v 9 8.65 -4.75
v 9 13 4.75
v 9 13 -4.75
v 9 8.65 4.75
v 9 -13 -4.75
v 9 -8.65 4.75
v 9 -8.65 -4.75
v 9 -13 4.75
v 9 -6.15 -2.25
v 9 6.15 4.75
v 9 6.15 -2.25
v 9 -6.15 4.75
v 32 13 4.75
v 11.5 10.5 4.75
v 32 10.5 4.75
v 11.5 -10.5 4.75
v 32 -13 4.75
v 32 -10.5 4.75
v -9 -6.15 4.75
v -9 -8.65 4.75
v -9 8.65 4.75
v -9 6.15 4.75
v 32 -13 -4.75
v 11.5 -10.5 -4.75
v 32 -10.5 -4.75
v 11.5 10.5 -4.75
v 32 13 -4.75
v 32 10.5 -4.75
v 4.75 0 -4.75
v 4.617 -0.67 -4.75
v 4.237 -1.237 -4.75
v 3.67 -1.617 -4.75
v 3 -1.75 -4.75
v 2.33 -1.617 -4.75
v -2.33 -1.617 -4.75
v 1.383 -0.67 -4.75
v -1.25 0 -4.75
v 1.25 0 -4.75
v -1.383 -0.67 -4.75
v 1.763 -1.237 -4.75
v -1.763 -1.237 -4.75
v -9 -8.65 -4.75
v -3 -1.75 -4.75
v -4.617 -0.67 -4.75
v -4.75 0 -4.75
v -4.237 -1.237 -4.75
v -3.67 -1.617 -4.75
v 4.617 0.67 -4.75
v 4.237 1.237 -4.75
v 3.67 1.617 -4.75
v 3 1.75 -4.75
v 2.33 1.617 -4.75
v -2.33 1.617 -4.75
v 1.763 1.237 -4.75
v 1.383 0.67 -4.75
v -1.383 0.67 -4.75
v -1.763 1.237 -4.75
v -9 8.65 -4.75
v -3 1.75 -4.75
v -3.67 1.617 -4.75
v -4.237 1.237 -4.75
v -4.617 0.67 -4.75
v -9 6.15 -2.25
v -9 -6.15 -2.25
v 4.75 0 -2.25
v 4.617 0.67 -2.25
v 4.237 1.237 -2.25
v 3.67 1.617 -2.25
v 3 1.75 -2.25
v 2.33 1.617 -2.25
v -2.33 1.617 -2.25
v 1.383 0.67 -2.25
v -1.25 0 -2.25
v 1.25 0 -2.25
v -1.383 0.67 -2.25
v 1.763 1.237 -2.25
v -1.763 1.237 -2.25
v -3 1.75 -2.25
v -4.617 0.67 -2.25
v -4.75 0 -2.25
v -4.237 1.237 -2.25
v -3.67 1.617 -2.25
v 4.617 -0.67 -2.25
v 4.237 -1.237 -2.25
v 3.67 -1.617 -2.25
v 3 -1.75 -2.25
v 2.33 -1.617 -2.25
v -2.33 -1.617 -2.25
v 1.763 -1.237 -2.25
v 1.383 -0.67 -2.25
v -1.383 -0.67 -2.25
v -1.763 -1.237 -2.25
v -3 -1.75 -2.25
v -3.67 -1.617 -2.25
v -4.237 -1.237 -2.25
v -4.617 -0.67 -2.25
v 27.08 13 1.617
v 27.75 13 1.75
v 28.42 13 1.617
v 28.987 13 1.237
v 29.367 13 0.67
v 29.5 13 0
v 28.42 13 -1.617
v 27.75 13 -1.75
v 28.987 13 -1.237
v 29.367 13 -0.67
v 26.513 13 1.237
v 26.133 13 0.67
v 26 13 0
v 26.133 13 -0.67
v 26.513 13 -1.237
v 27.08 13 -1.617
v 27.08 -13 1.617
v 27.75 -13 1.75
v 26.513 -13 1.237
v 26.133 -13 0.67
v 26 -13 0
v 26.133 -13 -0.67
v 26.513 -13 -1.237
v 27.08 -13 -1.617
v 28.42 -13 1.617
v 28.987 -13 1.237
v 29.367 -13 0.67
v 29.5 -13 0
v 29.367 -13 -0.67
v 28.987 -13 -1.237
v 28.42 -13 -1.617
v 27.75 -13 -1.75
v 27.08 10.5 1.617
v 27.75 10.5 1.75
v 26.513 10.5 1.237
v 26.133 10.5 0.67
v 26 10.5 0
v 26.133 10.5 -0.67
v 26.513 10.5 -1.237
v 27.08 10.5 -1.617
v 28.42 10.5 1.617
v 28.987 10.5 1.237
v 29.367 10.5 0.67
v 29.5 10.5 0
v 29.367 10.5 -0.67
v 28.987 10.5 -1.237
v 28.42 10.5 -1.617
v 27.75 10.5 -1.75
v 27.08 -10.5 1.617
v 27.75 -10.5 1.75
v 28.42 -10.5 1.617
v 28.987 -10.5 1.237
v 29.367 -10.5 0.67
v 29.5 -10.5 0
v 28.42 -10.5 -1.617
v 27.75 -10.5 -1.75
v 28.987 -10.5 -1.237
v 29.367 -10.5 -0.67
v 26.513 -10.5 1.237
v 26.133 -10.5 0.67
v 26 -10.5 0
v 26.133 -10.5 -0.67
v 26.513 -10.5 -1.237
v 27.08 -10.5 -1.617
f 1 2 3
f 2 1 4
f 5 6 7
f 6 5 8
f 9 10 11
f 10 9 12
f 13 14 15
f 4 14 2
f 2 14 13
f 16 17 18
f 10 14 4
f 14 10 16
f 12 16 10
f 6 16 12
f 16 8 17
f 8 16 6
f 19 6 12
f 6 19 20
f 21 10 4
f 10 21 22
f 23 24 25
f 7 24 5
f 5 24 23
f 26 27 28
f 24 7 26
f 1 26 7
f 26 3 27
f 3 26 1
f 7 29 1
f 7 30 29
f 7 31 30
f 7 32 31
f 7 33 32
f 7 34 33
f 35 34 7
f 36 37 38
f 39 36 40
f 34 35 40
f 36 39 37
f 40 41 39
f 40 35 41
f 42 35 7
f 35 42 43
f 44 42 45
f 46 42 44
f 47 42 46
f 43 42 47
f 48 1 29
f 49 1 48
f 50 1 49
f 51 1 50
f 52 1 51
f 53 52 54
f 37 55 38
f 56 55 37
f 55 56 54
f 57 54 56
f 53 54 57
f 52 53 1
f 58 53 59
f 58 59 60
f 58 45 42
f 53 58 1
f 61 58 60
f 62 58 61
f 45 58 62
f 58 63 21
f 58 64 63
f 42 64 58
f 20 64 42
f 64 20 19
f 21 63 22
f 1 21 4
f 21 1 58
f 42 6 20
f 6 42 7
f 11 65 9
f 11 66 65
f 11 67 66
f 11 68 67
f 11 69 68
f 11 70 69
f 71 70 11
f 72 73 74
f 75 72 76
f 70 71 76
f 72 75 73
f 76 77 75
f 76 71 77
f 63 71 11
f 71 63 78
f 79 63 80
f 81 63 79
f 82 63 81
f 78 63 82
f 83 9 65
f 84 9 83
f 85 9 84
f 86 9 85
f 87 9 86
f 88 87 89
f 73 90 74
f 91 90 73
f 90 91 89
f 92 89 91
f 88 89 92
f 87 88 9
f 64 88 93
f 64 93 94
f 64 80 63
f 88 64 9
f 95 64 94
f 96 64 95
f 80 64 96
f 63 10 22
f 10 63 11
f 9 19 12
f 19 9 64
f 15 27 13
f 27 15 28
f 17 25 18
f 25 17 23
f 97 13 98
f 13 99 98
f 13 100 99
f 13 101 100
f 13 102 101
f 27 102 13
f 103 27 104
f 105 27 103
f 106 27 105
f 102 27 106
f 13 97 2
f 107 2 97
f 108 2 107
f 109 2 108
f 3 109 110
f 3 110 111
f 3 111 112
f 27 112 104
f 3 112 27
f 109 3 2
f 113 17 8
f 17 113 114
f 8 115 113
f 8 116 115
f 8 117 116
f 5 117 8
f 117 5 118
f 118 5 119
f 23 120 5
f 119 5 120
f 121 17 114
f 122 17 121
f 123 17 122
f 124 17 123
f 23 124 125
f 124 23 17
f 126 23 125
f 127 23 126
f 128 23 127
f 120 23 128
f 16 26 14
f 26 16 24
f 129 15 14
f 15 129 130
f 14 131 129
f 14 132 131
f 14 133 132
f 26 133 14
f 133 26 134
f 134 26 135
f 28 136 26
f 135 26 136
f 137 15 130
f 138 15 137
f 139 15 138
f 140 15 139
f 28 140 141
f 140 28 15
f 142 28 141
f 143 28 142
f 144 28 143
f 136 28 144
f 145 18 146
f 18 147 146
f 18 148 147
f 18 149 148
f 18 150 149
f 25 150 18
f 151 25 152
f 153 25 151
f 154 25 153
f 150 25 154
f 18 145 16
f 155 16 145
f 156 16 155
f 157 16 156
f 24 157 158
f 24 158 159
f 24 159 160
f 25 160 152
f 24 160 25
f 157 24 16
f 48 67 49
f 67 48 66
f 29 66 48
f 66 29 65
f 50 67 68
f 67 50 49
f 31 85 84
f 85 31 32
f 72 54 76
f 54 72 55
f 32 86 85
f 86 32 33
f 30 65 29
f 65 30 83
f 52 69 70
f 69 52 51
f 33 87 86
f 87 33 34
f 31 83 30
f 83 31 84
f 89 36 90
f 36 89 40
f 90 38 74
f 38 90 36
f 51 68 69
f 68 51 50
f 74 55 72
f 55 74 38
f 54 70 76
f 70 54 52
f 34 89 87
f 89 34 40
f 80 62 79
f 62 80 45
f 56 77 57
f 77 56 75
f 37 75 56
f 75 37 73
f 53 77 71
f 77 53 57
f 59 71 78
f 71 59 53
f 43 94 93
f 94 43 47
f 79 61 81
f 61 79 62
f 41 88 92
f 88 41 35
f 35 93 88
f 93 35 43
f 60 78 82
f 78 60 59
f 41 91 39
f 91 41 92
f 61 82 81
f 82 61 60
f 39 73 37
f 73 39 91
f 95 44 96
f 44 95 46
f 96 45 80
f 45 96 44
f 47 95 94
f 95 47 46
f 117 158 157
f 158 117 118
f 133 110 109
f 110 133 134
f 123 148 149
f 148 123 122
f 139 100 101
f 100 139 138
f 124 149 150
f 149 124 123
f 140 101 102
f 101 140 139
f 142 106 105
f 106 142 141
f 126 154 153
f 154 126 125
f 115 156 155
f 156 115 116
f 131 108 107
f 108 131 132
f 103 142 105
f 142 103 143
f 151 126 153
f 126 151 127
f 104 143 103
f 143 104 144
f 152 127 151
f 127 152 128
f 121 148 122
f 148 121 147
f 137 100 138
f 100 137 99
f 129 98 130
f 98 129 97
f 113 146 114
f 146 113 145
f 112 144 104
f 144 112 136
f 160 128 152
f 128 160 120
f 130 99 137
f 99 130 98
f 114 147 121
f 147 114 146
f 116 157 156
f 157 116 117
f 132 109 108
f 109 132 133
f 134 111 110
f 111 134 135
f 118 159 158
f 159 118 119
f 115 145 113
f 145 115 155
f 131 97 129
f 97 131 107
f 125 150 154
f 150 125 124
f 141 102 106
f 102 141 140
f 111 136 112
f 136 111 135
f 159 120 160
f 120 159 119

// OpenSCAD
width_in_studs  = 1;
teeth=48;
length= 170;
brick_height=7;
pocketZ=3.5;
screw_dia=3.5;
screw_posX=165;
screw_dist=6;

filz_mountX=18;
filz_dia=24;
filz_width=21;

  
  brick_width         = 12;
  stud_diameter       = 4.88;
 
  tooth_base_width    = 2.3;
  tooth_tip_width     = 0.87;
  tooth_height        = 2.06;
  tooth_top           = 5.79;
  tooth_tip_radius    = 0.15;
  teeth_per_brick     = 3.1;
  half_pegs_per_brick = 2;
  gap_width           = 0.884;



module tooth() {
  $fn = 20;
  

  //render()
  x_a = -((tooth_tip_width/2) - tooth_tip_radius);
  x_b = (tooth_tip_width/2) - tooth_tip_radius;
  translate([(gap_width+tooth_base_width)/2,0,-tooth_height+brick_height])
  rotate([0,0,180])
  translate([0,-(brick_width * width_in_studs)/2,tooth_height]) {
    difference() {
      hull() {
        translate([x_a,0,tooth_height]) rotate([90,0,0]) cylinder(r=tooth_tip_radius,   h=(brick_width * width_in_studs), center=true);
        translate([x_b,0,tooth_height]) rotate([90,0,0]) cylinder(r=tooth_tip_radius,   h=(brick_width * width_in_studs), center=true);
        translate([0,0,0])              rotate([90,0,0]) cylinder(r=tooth_base_width/2, h=(brick_width * width_in_studs), center=true);
      }
      translate([0,0,-1]) cube(size=[gap_width + tooth_base_width, brick_width * width_in_studs + 1, 1.9], center=true);
    }
  }
}

module rack() {
   wall_thickness      = 2;
difference(){
union(){
  tooth_width = tooth_base_width + gap_width;
  
 
  for ( i = [0 : teeth-1]) {
    translate([i * (tooth_base_width + gap_width), 0, 0]) tooth();
  }

  difference() {
    cube(size=[(length), (brick_width * width_in_studs), brick_height]);
    translate([wall_thickness,wall_thickness,0]) cube(size=[length - (wall_thickness*2), (brick_width * width_in_studs) - (wall_thickness*2), pocketZ]);
    // shave a bit off the beginning and end of the brick
    translate([-1.98,-1,0]) cube(size=[2, (brick_width * width_in_studs)+2, 10]);
    translate([length - 0.02,-1,0]) cube(size=[2,length+2, 10]);
  }

 }

translate([screw_posX,brick_width/2,0])cylinder(d=screw_dia, h=brick_height+1,$fn=16);
translate([screw_posX-screw_dist,brick_width/2,0])cylinder(d=screw_dia, h=brick_height+1,$fn=16);
}
}

module filz_mount(){
    wall_thickness      = 2.5;
    tolerance=0.3;
    height=brick_height+wall_thickness;
    block_rackY=filz_dia/2+3*wall_thickness+screw_dia;
    block_filzX=filz_dia/2+3*wall_thickness+screw_dia;
    block_filzY=filz_width+2*wall_thickness;
difference(){    
union(){
difference(){
cube([filz_mountX,brick_width+2*wall_thickness+tolerance,height],center=true);
translate([0,0,wall_thickness])cube([filz_mountX,brick_width+tolerance,height],center=true);    
}
difference(){
translate([filz_mountX/2+ block_filzX/2,0,0])cube([block_filzX,block_filzY,brick_height+wall_thickness],center=true); 
translate([filz_mountX/2+ block_filzX/2+wall_thickness,0,0])cube([block_filzX,filz_width,brick_height+wall_thickness],center=true); 
    }
}
translate([screw_dist/2,0,0])cylinder(d=screw_dia, h=brick_height+wall_thickness+1,$fn=16,center=true);
translate([-screw_dist/2,0,0])cylinder(d=screw_dia, h=brick_height+wall_thickness+1,$fn=16,center=true);
translate([filz_mountX/2+block_filzX-screw_dia/2-wall_thickness,0,0])rotate([90,0,0])cylinder(d=screw_dia, h=filz_width+2*wall_thickness+1,$fn=16,center=true);
}
}

//rack();
filz_mount();
